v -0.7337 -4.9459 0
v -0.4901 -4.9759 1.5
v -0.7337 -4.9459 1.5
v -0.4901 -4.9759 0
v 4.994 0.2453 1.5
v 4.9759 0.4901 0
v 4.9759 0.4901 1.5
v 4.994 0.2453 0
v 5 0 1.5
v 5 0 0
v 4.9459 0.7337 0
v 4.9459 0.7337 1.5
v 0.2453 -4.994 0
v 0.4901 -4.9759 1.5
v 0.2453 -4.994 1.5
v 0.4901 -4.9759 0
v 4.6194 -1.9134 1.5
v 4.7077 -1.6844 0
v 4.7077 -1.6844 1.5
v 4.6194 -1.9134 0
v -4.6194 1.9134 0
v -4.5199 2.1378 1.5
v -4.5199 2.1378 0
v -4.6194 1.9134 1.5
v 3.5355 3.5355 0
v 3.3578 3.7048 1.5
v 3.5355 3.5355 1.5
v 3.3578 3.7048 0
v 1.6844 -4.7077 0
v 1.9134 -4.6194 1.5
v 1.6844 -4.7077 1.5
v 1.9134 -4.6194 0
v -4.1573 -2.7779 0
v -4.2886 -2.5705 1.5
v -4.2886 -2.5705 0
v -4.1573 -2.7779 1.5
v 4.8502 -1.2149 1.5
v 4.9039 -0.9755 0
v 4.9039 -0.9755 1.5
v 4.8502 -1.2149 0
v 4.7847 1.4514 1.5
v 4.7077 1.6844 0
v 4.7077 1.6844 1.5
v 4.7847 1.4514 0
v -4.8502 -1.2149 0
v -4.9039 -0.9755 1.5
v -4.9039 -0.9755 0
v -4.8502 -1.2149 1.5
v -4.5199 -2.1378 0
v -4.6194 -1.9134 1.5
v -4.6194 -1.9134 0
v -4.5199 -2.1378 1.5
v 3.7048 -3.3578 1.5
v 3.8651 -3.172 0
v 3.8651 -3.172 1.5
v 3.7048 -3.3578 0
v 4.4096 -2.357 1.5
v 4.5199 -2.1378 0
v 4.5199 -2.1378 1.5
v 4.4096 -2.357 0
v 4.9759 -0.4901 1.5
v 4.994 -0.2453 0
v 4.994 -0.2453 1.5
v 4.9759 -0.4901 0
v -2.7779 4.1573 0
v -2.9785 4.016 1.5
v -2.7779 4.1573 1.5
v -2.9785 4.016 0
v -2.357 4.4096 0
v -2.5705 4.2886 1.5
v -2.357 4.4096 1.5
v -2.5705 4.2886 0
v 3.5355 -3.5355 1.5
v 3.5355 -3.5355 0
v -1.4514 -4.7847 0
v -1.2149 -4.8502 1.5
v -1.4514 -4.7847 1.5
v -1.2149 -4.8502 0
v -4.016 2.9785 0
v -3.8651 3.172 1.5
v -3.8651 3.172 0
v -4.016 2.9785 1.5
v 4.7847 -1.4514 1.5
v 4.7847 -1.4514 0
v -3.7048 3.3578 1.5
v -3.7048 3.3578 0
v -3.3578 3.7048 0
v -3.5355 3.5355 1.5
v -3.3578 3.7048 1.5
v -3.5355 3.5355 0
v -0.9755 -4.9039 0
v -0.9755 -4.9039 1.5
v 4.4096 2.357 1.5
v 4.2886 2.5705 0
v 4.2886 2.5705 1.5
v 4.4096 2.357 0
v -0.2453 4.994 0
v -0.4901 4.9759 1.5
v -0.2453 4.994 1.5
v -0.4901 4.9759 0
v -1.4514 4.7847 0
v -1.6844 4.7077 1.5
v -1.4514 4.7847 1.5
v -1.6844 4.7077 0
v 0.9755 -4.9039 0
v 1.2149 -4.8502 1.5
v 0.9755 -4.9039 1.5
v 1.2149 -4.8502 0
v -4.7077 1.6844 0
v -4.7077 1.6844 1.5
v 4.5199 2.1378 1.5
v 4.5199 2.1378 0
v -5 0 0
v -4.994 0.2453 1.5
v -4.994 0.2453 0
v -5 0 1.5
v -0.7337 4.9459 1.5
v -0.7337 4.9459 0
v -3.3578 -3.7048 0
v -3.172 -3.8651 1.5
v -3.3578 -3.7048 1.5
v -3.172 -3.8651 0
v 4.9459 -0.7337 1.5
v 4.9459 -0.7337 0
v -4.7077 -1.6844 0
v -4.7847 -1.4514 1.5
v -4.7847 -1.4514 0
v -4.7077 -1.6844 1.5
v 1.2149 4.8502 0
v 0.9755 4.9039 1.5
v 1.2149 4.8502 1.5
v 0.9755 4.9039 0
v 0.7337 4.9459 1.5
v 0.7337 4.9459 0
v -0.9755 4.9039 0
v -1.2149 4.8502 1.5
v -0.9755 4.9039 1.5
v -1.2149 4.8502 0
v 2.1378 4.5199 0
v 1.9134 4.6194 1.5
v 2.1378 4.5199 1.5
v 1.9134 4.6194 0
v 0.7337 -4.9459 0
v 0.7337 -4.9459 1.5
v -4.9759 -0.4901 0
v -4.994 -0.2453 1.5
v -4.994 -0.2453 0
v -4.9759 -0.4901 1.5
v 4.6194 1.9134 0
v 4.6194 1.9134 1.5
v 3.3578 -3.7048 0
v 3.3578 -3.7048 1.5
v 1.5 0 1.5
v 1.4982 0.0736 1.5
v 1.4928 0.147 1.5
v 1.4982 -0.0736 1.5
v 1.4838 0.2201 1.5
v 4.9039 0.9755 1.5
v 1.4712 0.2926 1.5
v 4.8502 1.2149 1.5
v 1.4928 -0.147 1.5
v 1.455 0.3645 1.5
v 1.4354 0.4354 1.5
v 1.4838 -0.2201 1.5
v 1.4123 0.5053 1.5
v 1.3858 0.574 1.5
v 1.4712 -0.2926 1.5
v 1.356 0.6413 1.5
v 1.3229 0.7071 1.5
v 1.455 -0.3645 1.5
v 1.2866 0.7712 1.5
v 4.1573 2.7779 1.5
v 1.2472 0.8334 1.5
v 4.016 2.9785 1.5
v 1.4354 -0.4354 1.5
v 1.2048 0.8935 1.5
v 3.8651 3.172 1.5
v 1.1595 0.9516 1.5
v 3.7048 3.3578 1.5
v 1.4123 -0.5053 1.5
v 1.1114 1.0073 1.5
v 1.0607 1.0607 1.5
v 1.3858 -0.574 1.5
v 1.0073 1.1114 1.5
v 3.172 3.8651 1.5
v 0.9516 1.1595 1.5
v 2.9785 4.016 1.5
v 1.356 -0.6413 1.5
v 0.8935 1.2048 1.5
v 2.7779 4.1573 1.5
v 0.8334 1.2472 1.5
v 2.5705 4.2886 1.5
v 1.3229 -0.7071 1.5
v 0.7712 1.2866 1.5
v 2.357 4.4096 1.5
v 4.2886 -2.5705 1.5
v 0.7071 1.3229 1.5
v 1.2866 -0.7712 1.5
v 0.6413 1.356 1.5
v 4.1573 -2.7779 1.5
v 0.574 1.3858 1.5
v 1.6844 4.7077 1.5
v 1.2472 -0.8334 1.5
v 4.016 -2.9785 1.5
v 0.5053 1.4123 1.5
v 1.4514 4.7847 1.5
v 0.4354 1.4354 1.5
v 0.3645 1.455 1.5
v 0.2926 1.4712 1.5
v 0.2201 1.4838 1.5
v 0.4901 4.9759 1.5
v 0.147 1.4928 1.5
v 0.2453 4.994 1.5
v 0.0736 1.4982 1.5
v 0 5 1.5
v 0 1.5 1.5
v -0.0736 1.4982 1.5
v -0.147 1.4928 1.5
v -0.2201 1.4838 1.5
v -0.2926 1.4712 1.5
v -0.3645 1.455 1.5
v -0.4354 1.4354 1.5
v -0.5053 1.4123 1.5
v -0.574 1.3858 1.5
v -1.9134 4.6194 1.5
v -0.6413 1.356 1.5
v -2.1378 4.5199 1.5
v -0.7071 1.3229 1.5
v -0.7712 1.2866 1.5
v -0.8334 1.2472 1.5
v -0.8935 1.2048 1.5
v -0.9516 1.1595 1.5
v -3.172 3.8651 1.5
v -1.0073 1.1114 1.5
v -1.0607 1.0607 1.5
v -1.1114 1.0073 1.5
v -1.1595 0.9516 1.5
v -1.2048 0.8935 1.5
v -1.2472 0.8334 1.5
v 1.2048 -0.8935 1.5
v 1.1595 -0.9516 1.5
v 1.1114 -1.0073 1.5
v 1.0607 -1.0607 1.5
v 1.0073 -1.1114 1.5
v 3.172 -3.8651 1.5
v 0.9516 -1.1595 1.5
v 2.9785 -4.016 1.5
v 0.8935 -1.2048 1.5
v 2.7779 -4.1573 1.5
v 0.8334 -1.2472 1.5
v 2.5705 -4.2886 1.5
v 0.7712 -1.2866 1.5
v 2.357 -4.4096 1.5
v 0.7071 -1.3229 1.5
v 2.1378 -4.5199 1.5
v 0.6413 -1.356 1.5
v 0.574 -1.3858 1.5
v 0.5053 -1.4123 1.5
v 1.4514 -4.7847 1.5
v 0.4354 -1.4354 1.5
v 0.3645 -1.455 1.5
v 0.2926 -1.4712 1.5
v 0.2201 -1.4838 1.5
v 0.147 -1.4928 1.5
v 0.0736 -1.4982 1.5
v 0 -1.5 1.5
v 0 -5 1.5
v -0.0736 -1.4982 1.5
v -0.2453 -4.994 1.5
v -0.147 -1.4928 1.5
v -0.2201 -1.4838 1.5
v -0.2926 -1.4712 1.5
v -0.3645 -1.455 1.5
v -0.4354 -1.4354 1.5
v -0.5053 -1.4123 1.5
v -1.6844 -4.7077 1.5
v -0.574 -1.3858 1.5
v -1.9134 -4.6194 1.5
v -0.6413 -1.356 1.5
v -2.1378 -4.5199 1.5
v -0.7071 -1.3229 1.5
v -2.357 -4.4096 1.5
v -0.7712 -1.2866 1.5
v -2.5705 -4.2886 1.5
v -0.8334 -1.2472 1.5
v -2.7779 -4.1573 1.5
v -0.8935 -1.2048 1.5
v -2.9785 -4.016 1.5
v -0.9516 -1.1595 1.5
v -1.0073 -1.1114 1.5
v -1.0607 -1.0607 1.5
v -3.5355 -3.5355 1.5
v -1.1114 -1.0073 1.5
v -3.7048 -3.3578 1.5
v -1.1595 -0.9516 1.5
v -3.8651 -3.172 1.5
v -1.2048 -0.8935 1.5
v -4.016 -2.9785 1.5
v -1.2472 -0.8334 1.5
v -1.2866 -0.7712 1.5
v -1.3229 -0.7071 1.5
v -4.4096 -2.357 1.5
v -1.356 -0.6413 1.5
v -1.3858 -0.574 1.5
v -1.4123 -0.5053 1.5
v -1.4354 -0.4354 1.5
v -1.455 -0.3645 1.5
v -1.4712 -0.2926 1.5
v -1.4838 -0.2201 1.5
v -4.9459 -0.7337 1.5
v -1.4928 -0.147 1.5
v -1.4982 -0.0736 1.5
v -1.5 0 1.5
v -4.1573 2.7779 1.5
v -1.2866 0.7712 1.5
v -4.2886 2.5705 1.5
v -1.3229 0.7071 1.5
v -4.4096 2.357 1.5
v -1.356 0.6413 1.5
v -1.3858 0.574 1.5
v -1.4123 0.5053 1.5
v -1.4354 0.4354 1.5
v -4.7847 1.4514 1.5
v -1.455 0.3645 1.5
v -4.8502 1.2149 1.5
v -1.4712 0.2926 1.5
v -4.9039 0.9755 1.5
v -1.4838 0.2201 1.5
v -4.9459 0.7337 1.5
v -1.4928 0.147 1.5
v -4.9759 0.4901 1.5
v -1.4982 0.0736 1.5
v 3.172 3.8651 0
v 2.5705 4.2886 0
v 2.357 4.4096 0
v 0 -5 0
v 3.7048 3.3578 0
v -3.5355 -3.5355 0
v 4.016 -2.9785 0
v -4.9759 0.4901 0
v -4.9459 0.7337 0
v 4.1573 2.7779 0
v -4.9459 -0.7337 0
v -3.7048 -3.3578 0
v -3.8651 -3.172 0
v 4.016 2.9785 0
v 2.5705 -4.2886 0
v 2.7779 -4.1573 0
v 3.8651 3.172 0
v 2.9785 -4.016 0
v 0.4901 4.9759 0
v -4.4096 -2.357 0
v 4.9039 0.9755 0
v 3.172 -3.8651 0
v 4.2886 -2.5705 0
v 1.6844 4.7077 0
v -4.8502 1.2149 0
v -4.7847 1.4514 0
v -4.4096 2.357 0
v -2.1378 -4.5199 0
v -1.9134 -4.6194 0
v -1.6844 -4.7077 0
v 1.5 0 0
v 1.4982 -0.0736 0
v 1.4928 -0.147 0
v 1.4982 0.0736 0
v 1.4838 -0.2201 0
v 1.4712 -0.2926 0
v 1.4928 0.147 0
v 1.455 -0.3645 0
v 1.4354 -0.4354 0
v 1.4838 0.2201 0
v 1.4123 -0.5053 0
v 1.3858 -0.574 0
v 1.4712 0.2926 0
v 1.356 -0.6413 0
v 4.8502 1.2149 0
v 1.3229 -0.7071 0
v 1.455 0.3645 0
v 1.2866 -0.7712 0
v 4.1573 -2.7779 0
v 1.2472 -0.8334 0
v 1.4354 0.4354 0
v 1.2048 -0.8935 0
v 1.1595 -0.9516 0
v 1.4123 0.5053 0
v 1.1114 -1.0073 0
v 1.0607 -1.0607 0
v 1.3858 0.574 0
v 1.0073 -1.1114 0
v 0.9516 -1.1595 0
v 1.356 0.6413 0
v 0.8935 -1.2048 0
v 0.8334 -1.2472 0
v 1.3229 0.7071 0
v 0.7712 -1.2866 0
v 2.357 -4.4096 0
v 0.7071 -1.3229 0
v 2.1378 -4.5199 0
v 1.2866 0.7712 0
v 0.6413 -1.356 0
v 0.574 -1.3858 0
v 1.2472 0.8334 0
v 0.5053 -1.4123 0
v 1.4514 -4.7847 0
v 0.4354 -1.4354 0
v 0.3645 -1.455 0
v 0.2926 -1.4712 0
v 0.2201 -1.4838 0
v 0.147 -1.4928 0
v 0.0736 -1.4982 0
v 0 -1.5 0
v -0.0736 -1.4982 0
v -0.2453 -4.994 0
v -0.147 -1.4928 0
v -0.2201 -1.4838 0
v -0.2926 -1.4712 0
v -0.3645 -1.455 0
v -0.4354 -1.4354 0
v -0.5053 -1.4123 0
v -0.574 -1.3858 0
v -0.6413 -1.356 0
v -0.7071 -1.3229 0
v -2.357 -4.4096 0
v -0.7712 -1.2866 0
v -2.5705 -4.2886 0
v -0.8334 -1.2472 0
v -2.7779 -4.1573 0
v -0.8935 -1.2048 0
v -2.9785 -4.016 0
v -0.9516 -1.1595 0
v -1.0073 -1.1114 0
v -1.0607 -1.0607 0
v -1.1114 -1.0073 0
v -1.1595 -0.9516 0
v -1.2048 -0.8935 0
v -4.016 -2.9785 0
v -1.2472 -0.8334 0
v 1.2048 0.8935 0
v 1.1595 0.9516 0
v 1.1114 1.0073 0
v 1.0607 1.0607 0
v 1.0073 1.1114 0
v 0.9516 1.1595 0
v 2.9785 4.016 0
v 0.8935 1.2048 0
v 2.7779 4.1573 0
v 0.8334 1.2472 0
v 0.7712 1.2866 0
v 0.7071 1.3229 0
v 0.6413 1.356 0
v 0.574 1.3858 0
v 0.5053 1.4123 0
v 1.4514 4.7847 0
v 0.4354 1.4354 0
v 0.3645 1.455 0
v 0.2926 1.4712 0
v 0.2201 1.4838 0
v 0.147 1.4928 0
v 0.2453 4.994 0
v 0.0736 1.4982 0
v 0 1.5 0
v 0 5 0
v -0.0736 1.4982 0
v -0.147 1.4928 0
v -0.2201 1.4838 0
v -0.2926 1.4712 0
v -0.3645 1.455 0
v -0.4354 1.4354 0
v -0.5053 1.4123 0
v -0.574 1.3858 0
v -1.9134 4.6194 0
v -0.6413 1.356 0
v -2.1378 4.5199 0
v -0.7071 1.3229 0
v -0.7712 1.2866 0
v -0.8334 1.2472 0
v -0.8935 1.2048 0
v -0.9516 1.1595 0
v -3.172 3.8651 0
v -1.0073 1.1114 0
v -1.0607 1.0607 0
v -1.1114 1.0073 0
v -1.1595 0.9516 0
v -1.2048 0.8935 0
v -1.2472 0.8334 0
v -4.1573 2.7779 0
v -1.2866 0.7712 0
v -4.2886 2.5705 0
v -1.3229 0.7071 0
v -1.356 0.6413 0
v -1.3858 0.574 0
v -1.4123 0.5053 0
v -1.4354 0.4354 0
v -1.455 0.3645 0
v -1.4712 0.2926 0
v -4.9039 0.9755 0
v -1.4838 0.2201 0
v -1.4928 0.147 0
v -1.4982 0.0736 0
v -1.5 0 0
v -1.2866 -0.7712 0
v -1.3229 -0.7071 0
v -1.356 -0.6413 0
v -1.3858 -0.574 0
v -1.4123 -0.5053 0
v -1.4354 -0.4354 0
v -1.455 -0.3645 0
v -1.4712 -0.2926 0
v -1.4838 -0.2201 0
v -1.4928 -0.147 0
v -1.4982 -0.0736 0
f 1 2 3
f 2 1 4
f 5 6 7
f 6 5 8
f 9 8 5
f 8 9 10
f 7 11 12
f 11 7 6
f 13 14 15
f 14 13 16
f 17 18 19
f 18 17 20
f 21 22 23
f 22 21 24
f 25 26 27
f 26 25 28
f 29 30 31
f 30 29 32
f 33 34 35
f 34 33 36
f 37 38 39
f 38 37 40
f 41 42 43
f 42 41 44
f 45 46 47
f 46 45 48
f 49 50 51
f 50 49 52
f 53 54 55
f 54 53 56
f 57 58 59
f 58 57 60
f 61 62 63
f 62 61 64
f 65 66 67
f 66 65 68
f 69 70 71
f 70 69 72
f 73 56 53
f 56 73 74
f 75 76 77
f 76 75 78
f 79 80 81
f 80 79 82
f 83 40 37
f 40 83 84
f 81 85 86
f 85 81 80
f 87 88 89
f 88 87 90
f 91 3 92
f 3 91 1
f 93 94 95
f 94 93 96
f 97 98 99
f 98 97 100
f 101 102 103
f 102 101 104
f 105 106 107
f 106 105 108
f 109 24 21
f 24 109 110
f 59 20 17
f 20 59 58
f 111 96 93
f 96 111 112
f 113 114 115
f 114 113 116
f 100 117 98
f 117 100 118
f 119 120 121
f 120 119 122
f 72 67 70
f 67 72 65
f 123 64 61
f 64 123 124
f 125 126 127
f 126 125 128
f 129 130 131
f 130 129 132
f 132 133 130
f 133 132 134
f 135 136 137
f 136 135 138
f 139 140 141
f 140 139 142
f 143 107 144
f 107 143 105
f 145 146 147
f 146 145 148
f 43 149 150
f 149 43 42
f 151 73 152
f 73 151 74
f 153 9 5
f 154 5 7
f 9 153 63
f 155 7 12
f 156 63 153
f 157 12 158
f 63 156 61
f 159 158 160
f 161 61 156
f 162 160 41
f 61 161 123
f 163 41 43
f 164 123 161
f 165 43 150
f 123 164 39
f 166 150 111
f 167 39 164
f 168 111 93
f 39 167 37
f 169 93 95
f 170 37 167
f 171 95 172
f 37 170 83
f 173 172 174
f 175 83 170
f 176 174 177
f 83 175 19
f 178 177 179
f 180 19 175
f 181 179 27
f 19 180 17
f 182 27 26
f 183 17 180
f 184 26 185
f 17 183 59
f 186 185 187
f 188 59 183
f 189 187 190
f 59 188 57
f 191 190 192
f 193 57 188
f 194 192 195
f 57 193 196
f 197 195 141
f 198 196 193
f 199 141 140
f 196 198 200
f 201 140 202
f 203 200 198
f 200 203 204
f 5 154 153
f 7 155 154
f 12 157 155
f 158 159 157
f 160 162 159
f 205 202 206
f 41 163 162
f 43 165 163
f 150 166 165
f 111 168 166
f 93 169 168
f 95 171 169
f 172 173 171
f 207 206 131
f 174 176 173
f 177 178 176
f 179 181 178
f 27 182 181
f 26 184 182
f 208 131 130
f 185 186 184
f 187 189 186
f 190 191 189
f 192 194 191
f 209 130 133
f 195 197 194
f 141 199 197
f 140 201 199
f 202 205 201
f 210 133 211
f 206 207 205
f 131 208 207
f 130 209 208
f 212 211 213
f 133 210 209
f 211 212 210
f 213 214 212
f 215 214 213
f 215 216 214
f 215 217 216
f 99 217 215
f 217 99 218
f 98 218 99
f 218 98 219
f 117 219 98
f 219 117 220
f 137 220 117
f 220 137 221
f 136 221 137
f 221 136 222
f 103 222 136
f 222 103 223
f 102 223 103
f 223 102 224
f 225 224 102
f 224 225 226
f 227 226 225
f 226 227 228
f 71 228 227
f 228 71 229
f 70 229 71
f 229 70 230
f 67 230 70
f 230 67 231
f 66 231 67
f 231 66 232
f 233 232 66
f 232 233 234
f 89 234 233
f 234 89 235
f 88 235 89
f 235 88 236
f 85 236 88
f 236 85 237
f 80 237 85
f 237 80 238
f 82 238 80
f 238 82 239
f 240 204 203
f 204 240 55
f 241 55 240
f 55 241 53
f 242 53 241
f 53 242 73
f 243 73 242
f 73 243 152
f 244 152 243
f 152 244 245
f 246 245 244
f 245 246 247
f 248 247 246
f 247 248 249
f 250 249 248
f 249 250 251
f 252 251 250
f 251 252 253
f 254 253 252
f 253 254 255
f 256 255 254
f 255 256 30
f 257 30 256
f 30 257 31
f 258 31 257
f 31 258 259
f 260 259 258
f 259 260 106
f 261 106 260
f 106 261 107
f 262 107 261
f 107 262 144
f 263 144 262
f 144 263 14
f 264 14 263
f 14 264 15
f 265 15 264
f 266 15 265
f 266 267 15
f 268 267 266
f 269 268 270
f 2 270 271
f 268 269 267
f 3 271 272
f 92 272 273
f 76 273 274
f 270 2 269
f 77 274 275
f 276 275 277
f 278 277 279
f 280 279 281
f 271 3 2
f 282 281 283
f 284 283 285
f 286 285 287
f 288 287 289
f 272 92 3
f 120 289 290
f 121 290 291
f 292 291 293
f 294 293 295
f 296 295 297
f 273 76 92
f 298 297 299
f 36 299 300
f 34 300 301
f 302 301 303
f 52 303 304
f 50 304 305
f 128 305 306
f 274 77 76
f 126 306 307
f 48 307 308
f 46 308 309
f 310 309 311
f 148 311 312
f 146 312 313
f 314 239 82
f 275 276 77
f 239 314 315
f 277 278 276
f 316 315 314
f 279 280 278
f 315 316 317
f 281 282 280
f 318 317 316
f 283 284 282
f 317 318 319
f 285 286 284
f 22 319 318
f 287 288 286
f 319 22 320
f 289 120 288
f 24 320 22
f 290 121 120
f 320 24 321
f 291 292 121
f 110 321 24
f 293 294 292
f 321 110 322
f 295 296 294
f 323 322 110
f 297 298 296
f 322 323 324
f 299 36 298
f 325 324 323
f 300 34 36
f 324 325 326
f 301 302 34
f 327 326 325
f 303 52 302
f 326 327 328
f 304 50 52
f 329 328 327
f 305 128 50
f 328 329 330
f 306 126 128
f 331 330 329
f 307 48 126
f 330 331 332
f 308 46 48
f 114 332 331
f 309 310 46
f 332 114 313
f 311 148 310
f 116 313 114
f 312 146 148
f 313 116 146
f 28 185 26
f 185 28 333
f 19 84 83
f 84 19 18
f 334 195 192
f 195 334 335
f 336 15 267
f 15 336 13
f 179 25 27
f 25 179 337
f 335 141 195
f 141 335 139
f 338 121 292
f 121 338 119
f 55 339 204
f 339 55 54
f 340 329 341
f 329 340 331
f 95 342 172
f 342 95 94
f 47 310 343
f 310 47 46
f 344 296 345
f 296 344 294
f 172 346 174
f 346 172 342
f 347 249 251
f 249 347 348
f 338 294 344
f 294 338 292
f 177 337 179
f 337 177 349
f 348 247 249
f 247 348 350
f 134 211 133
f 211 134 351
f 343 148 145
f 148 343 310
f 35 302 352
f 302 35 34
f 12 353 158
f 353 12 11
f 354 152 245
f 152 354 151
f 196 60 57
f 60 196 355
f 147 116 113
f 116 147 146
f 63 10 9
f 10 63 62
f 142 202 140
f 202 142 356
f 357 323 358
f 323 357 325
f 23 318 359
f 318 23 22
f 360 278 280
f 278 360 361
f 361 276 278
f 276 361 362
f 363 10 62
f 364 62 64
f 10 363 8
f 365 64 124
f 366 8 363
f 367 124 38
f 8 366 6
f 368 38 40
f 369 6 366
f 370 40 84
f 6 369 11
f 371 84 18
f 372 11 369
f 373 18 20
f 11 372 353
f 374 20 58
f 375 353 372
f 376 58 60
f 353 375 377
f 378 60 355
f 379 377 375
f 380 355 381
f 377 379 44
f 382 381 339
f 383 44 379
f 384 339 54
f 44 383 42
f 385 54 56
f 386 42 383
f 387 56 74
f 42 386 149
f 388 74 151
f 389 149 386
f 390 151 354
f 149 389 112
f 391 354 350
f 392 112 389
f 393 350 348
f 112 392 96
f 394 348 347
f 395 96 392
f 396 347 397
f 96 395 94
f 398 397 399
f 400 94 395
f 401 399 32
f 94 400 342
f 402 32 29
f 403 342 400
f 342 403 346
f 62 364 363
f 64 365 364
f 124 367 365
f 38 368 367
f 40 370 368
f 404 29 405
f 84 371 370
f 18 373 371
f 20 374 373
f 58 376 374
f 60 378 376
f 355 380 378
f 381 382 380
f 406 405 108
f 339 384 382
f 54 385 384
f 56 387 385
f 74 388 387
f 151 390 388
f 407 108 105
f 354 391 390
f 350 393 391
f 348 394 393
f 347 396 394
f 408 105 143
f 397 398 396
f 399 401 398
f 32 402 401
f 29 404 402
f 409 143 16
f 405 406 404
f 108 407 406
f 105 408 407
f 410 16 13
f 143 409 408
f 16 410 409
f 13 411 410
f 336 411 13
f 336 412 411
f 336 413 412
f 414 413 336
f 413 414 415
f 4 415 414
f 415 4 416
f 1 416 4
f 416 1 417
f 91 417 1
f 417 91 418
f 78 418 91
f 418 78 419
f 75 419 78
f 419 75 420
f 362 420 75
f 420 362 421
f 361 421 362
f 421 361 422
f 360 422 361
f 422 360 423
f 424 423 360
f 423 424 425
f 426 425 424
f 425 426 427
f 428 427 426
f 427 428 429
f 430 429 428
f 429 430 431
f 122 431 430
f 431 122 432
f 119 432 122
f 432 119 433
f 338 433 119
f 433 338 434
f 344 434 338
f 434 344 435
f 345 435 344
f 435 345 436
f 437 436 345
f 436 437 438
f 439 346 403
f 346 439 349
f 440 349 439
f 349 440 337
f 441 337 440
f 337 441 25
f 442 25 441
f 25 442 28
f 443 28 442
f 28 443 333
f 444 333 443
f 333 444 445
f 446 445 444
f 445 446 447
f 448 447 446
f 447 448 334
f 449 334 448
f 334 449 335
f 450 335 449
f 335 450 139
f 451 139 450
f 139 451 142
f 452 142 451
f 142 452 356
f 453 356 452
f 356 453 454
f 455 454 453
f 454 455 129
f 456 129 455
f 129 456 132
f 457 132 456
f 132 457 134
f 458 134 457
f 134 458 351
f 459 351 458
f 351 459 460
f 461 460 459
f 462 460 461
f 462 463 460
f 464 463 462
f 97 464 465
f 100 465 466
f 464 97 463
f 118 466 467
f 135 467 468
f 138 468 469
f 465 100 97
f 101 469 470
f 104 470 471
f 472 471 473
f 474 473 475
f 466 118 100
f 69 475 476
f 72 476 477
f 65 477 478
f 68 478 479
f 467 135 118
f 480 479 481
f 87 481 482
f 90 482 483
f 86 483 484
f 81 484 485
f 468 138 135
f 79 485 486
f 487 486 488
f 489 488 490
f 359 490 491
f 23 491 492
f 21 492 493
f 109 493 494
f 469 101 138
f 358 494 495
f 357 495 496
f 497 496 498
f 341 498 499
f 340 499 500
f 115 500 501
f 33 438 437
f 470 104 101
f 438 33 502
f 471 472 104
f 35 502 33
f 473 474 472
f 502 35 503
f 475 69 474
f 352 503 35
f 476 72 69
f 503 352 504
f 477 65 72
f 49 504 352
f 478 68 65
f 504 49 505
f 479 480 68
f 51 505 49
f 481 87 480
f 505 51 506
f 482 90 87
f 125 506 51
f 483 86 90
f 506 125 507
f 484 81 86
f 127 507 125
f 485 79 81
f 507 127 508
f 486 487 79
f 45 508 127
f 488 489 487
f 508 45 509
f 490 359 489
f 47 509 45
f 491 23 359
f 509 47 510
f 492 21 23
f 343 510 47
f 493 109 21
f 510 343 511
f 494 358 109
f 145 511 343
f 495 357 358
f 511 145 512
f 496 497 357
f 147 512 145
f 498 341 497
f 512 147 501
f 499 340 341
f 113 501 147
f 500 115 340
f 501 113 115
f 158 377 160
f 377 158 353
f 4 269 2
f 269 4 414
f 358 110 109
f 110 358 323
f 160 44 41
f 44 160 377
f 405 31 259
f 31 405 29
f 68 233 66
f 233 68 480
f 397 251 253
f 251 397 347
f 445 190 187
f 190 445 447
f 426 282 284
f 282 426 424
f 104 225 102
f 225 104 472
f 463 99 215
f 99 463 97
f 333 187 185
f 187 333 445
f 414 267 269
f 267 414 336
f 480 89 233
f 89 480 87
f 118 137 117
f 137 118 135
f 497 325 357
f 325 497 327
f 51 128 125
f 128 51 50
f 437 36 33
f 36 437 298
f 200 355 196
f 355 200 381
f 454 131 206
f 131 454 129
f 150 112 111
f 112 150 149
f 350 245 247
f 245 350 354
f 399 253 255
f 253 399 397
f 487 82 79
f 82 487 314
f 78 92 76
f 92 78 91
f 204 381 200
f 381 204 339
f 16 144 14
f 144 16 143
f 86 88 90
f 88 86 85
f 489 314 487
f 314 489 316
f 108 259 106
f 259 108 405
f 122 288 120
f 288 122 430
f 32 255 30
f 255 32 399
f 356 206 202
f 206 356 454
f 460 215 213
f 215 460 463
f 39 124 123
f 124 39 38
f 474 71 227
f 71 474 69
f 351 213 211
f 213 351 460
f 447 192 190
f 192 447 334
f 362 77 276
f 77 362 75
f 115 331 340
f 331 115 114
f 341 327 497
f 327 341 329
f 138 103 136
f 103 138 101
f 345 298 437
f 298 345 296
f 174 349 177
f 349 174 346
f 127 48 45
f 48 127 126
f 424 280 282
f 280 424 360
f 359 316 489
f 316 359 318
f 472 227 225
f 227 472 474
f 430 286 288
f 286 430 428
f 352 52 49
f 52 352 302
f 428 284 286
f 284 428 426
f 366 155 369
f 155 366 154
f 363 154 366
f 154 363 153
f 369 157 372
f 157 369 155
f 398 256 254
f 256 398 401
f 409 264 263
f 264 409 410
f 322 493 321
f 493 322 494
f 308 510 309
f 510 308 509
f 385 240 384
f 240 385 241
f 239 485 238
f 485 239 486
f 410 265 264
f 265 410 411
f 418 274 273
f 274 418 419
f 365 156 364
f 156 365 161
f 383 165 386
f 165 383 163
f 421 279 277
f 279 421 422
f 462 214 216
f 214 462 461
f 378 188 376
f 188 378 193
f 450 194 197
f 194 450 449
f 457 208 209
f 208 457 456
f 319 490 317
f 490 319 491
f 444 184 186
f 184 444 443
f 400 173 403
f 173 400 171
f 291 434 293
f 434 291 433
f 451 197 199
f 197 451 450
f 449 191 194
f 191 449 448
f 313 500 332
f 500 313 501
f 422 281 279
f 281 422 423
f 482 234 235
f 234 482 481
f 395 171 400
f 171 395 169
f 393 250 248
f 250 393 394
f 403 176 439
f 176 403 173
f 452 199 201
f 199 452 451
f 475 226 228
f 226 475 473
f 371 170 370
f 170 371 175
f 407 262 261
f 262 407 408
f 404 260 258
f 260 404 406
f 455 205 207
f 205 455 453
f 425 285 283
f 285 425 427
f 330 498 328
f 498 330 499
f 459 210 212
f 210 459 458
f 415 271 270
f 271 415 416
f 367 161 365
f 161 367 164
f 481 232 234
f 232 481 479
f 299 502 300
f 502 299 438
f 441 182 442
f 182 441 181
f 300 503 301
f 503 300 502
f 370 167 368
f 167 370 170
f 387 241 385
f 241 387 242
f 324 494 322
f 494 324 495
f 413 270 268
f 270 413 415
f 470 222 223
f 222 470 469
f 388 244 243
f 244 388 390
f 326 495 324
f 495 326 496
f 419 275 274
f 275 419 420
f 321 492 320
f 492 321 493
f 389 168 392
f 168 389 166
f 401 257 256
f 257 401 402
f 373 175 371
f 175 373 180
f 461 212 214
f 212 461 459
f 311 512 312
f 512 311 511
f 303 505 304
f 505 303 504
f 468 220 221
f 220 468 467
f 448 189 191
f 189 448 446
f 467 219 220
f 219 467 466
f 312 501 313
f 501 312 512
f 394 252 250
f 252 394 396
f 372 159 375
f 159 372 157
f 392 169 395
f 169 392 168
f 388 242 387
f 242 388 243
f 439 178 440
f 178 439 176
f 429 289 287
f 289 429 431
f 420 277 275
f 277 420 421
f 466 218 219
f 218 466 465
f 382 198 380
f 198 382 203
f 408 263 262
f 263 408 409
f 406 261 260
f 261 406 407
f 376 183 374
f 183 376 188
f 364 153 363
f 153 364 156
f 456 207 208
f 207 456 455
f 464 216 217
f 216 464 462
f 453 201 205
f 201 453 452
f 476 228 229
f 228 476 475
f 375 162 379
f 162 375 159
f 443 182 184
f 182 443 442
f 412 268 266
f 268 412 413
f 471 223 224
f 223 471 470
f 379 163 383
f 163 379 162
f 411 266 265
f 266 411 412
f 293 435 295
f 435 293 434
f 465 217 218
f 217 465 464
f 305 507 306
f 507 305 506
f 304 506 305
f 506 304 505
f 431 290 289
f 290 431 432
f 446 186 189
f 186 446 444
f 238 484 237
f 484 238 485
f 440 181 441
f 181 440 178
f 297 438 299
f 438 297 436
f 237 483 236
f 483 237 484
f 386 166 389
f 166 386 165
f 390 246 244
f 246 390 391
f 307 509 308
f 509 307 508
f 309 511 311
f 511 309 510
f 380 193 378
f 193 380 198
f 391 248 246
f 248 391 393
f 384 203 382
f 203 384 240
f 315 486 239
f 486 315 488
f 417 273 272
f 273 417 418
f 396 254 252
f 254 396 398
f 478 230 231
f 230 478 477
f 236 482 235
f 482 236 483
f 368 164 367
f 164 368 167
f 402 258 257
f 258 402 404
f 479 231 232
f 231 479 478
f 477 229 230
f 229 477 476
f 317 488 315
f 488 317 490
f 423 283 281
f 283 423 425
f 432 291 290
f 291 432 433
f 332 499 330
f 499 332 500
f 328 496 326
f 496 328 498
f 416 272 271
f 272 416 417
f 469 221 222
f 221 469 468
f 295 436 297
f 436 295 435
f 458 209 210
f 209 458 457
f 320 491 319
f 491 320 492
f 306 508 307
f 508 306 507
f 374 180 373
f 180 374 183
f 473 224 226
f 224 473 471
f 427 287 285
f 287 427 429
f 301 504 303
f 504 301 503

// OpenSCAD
$fn = 128;

inner_d = 3.0;
outer_d = 10.0;
thickness = 1.5;

difference() {
  cylinder(d = outer_d, h = thickness);
  translate([0, 0, -0.1])
    cylinder(d = inner_d, h = thickness + 0.2);
}
